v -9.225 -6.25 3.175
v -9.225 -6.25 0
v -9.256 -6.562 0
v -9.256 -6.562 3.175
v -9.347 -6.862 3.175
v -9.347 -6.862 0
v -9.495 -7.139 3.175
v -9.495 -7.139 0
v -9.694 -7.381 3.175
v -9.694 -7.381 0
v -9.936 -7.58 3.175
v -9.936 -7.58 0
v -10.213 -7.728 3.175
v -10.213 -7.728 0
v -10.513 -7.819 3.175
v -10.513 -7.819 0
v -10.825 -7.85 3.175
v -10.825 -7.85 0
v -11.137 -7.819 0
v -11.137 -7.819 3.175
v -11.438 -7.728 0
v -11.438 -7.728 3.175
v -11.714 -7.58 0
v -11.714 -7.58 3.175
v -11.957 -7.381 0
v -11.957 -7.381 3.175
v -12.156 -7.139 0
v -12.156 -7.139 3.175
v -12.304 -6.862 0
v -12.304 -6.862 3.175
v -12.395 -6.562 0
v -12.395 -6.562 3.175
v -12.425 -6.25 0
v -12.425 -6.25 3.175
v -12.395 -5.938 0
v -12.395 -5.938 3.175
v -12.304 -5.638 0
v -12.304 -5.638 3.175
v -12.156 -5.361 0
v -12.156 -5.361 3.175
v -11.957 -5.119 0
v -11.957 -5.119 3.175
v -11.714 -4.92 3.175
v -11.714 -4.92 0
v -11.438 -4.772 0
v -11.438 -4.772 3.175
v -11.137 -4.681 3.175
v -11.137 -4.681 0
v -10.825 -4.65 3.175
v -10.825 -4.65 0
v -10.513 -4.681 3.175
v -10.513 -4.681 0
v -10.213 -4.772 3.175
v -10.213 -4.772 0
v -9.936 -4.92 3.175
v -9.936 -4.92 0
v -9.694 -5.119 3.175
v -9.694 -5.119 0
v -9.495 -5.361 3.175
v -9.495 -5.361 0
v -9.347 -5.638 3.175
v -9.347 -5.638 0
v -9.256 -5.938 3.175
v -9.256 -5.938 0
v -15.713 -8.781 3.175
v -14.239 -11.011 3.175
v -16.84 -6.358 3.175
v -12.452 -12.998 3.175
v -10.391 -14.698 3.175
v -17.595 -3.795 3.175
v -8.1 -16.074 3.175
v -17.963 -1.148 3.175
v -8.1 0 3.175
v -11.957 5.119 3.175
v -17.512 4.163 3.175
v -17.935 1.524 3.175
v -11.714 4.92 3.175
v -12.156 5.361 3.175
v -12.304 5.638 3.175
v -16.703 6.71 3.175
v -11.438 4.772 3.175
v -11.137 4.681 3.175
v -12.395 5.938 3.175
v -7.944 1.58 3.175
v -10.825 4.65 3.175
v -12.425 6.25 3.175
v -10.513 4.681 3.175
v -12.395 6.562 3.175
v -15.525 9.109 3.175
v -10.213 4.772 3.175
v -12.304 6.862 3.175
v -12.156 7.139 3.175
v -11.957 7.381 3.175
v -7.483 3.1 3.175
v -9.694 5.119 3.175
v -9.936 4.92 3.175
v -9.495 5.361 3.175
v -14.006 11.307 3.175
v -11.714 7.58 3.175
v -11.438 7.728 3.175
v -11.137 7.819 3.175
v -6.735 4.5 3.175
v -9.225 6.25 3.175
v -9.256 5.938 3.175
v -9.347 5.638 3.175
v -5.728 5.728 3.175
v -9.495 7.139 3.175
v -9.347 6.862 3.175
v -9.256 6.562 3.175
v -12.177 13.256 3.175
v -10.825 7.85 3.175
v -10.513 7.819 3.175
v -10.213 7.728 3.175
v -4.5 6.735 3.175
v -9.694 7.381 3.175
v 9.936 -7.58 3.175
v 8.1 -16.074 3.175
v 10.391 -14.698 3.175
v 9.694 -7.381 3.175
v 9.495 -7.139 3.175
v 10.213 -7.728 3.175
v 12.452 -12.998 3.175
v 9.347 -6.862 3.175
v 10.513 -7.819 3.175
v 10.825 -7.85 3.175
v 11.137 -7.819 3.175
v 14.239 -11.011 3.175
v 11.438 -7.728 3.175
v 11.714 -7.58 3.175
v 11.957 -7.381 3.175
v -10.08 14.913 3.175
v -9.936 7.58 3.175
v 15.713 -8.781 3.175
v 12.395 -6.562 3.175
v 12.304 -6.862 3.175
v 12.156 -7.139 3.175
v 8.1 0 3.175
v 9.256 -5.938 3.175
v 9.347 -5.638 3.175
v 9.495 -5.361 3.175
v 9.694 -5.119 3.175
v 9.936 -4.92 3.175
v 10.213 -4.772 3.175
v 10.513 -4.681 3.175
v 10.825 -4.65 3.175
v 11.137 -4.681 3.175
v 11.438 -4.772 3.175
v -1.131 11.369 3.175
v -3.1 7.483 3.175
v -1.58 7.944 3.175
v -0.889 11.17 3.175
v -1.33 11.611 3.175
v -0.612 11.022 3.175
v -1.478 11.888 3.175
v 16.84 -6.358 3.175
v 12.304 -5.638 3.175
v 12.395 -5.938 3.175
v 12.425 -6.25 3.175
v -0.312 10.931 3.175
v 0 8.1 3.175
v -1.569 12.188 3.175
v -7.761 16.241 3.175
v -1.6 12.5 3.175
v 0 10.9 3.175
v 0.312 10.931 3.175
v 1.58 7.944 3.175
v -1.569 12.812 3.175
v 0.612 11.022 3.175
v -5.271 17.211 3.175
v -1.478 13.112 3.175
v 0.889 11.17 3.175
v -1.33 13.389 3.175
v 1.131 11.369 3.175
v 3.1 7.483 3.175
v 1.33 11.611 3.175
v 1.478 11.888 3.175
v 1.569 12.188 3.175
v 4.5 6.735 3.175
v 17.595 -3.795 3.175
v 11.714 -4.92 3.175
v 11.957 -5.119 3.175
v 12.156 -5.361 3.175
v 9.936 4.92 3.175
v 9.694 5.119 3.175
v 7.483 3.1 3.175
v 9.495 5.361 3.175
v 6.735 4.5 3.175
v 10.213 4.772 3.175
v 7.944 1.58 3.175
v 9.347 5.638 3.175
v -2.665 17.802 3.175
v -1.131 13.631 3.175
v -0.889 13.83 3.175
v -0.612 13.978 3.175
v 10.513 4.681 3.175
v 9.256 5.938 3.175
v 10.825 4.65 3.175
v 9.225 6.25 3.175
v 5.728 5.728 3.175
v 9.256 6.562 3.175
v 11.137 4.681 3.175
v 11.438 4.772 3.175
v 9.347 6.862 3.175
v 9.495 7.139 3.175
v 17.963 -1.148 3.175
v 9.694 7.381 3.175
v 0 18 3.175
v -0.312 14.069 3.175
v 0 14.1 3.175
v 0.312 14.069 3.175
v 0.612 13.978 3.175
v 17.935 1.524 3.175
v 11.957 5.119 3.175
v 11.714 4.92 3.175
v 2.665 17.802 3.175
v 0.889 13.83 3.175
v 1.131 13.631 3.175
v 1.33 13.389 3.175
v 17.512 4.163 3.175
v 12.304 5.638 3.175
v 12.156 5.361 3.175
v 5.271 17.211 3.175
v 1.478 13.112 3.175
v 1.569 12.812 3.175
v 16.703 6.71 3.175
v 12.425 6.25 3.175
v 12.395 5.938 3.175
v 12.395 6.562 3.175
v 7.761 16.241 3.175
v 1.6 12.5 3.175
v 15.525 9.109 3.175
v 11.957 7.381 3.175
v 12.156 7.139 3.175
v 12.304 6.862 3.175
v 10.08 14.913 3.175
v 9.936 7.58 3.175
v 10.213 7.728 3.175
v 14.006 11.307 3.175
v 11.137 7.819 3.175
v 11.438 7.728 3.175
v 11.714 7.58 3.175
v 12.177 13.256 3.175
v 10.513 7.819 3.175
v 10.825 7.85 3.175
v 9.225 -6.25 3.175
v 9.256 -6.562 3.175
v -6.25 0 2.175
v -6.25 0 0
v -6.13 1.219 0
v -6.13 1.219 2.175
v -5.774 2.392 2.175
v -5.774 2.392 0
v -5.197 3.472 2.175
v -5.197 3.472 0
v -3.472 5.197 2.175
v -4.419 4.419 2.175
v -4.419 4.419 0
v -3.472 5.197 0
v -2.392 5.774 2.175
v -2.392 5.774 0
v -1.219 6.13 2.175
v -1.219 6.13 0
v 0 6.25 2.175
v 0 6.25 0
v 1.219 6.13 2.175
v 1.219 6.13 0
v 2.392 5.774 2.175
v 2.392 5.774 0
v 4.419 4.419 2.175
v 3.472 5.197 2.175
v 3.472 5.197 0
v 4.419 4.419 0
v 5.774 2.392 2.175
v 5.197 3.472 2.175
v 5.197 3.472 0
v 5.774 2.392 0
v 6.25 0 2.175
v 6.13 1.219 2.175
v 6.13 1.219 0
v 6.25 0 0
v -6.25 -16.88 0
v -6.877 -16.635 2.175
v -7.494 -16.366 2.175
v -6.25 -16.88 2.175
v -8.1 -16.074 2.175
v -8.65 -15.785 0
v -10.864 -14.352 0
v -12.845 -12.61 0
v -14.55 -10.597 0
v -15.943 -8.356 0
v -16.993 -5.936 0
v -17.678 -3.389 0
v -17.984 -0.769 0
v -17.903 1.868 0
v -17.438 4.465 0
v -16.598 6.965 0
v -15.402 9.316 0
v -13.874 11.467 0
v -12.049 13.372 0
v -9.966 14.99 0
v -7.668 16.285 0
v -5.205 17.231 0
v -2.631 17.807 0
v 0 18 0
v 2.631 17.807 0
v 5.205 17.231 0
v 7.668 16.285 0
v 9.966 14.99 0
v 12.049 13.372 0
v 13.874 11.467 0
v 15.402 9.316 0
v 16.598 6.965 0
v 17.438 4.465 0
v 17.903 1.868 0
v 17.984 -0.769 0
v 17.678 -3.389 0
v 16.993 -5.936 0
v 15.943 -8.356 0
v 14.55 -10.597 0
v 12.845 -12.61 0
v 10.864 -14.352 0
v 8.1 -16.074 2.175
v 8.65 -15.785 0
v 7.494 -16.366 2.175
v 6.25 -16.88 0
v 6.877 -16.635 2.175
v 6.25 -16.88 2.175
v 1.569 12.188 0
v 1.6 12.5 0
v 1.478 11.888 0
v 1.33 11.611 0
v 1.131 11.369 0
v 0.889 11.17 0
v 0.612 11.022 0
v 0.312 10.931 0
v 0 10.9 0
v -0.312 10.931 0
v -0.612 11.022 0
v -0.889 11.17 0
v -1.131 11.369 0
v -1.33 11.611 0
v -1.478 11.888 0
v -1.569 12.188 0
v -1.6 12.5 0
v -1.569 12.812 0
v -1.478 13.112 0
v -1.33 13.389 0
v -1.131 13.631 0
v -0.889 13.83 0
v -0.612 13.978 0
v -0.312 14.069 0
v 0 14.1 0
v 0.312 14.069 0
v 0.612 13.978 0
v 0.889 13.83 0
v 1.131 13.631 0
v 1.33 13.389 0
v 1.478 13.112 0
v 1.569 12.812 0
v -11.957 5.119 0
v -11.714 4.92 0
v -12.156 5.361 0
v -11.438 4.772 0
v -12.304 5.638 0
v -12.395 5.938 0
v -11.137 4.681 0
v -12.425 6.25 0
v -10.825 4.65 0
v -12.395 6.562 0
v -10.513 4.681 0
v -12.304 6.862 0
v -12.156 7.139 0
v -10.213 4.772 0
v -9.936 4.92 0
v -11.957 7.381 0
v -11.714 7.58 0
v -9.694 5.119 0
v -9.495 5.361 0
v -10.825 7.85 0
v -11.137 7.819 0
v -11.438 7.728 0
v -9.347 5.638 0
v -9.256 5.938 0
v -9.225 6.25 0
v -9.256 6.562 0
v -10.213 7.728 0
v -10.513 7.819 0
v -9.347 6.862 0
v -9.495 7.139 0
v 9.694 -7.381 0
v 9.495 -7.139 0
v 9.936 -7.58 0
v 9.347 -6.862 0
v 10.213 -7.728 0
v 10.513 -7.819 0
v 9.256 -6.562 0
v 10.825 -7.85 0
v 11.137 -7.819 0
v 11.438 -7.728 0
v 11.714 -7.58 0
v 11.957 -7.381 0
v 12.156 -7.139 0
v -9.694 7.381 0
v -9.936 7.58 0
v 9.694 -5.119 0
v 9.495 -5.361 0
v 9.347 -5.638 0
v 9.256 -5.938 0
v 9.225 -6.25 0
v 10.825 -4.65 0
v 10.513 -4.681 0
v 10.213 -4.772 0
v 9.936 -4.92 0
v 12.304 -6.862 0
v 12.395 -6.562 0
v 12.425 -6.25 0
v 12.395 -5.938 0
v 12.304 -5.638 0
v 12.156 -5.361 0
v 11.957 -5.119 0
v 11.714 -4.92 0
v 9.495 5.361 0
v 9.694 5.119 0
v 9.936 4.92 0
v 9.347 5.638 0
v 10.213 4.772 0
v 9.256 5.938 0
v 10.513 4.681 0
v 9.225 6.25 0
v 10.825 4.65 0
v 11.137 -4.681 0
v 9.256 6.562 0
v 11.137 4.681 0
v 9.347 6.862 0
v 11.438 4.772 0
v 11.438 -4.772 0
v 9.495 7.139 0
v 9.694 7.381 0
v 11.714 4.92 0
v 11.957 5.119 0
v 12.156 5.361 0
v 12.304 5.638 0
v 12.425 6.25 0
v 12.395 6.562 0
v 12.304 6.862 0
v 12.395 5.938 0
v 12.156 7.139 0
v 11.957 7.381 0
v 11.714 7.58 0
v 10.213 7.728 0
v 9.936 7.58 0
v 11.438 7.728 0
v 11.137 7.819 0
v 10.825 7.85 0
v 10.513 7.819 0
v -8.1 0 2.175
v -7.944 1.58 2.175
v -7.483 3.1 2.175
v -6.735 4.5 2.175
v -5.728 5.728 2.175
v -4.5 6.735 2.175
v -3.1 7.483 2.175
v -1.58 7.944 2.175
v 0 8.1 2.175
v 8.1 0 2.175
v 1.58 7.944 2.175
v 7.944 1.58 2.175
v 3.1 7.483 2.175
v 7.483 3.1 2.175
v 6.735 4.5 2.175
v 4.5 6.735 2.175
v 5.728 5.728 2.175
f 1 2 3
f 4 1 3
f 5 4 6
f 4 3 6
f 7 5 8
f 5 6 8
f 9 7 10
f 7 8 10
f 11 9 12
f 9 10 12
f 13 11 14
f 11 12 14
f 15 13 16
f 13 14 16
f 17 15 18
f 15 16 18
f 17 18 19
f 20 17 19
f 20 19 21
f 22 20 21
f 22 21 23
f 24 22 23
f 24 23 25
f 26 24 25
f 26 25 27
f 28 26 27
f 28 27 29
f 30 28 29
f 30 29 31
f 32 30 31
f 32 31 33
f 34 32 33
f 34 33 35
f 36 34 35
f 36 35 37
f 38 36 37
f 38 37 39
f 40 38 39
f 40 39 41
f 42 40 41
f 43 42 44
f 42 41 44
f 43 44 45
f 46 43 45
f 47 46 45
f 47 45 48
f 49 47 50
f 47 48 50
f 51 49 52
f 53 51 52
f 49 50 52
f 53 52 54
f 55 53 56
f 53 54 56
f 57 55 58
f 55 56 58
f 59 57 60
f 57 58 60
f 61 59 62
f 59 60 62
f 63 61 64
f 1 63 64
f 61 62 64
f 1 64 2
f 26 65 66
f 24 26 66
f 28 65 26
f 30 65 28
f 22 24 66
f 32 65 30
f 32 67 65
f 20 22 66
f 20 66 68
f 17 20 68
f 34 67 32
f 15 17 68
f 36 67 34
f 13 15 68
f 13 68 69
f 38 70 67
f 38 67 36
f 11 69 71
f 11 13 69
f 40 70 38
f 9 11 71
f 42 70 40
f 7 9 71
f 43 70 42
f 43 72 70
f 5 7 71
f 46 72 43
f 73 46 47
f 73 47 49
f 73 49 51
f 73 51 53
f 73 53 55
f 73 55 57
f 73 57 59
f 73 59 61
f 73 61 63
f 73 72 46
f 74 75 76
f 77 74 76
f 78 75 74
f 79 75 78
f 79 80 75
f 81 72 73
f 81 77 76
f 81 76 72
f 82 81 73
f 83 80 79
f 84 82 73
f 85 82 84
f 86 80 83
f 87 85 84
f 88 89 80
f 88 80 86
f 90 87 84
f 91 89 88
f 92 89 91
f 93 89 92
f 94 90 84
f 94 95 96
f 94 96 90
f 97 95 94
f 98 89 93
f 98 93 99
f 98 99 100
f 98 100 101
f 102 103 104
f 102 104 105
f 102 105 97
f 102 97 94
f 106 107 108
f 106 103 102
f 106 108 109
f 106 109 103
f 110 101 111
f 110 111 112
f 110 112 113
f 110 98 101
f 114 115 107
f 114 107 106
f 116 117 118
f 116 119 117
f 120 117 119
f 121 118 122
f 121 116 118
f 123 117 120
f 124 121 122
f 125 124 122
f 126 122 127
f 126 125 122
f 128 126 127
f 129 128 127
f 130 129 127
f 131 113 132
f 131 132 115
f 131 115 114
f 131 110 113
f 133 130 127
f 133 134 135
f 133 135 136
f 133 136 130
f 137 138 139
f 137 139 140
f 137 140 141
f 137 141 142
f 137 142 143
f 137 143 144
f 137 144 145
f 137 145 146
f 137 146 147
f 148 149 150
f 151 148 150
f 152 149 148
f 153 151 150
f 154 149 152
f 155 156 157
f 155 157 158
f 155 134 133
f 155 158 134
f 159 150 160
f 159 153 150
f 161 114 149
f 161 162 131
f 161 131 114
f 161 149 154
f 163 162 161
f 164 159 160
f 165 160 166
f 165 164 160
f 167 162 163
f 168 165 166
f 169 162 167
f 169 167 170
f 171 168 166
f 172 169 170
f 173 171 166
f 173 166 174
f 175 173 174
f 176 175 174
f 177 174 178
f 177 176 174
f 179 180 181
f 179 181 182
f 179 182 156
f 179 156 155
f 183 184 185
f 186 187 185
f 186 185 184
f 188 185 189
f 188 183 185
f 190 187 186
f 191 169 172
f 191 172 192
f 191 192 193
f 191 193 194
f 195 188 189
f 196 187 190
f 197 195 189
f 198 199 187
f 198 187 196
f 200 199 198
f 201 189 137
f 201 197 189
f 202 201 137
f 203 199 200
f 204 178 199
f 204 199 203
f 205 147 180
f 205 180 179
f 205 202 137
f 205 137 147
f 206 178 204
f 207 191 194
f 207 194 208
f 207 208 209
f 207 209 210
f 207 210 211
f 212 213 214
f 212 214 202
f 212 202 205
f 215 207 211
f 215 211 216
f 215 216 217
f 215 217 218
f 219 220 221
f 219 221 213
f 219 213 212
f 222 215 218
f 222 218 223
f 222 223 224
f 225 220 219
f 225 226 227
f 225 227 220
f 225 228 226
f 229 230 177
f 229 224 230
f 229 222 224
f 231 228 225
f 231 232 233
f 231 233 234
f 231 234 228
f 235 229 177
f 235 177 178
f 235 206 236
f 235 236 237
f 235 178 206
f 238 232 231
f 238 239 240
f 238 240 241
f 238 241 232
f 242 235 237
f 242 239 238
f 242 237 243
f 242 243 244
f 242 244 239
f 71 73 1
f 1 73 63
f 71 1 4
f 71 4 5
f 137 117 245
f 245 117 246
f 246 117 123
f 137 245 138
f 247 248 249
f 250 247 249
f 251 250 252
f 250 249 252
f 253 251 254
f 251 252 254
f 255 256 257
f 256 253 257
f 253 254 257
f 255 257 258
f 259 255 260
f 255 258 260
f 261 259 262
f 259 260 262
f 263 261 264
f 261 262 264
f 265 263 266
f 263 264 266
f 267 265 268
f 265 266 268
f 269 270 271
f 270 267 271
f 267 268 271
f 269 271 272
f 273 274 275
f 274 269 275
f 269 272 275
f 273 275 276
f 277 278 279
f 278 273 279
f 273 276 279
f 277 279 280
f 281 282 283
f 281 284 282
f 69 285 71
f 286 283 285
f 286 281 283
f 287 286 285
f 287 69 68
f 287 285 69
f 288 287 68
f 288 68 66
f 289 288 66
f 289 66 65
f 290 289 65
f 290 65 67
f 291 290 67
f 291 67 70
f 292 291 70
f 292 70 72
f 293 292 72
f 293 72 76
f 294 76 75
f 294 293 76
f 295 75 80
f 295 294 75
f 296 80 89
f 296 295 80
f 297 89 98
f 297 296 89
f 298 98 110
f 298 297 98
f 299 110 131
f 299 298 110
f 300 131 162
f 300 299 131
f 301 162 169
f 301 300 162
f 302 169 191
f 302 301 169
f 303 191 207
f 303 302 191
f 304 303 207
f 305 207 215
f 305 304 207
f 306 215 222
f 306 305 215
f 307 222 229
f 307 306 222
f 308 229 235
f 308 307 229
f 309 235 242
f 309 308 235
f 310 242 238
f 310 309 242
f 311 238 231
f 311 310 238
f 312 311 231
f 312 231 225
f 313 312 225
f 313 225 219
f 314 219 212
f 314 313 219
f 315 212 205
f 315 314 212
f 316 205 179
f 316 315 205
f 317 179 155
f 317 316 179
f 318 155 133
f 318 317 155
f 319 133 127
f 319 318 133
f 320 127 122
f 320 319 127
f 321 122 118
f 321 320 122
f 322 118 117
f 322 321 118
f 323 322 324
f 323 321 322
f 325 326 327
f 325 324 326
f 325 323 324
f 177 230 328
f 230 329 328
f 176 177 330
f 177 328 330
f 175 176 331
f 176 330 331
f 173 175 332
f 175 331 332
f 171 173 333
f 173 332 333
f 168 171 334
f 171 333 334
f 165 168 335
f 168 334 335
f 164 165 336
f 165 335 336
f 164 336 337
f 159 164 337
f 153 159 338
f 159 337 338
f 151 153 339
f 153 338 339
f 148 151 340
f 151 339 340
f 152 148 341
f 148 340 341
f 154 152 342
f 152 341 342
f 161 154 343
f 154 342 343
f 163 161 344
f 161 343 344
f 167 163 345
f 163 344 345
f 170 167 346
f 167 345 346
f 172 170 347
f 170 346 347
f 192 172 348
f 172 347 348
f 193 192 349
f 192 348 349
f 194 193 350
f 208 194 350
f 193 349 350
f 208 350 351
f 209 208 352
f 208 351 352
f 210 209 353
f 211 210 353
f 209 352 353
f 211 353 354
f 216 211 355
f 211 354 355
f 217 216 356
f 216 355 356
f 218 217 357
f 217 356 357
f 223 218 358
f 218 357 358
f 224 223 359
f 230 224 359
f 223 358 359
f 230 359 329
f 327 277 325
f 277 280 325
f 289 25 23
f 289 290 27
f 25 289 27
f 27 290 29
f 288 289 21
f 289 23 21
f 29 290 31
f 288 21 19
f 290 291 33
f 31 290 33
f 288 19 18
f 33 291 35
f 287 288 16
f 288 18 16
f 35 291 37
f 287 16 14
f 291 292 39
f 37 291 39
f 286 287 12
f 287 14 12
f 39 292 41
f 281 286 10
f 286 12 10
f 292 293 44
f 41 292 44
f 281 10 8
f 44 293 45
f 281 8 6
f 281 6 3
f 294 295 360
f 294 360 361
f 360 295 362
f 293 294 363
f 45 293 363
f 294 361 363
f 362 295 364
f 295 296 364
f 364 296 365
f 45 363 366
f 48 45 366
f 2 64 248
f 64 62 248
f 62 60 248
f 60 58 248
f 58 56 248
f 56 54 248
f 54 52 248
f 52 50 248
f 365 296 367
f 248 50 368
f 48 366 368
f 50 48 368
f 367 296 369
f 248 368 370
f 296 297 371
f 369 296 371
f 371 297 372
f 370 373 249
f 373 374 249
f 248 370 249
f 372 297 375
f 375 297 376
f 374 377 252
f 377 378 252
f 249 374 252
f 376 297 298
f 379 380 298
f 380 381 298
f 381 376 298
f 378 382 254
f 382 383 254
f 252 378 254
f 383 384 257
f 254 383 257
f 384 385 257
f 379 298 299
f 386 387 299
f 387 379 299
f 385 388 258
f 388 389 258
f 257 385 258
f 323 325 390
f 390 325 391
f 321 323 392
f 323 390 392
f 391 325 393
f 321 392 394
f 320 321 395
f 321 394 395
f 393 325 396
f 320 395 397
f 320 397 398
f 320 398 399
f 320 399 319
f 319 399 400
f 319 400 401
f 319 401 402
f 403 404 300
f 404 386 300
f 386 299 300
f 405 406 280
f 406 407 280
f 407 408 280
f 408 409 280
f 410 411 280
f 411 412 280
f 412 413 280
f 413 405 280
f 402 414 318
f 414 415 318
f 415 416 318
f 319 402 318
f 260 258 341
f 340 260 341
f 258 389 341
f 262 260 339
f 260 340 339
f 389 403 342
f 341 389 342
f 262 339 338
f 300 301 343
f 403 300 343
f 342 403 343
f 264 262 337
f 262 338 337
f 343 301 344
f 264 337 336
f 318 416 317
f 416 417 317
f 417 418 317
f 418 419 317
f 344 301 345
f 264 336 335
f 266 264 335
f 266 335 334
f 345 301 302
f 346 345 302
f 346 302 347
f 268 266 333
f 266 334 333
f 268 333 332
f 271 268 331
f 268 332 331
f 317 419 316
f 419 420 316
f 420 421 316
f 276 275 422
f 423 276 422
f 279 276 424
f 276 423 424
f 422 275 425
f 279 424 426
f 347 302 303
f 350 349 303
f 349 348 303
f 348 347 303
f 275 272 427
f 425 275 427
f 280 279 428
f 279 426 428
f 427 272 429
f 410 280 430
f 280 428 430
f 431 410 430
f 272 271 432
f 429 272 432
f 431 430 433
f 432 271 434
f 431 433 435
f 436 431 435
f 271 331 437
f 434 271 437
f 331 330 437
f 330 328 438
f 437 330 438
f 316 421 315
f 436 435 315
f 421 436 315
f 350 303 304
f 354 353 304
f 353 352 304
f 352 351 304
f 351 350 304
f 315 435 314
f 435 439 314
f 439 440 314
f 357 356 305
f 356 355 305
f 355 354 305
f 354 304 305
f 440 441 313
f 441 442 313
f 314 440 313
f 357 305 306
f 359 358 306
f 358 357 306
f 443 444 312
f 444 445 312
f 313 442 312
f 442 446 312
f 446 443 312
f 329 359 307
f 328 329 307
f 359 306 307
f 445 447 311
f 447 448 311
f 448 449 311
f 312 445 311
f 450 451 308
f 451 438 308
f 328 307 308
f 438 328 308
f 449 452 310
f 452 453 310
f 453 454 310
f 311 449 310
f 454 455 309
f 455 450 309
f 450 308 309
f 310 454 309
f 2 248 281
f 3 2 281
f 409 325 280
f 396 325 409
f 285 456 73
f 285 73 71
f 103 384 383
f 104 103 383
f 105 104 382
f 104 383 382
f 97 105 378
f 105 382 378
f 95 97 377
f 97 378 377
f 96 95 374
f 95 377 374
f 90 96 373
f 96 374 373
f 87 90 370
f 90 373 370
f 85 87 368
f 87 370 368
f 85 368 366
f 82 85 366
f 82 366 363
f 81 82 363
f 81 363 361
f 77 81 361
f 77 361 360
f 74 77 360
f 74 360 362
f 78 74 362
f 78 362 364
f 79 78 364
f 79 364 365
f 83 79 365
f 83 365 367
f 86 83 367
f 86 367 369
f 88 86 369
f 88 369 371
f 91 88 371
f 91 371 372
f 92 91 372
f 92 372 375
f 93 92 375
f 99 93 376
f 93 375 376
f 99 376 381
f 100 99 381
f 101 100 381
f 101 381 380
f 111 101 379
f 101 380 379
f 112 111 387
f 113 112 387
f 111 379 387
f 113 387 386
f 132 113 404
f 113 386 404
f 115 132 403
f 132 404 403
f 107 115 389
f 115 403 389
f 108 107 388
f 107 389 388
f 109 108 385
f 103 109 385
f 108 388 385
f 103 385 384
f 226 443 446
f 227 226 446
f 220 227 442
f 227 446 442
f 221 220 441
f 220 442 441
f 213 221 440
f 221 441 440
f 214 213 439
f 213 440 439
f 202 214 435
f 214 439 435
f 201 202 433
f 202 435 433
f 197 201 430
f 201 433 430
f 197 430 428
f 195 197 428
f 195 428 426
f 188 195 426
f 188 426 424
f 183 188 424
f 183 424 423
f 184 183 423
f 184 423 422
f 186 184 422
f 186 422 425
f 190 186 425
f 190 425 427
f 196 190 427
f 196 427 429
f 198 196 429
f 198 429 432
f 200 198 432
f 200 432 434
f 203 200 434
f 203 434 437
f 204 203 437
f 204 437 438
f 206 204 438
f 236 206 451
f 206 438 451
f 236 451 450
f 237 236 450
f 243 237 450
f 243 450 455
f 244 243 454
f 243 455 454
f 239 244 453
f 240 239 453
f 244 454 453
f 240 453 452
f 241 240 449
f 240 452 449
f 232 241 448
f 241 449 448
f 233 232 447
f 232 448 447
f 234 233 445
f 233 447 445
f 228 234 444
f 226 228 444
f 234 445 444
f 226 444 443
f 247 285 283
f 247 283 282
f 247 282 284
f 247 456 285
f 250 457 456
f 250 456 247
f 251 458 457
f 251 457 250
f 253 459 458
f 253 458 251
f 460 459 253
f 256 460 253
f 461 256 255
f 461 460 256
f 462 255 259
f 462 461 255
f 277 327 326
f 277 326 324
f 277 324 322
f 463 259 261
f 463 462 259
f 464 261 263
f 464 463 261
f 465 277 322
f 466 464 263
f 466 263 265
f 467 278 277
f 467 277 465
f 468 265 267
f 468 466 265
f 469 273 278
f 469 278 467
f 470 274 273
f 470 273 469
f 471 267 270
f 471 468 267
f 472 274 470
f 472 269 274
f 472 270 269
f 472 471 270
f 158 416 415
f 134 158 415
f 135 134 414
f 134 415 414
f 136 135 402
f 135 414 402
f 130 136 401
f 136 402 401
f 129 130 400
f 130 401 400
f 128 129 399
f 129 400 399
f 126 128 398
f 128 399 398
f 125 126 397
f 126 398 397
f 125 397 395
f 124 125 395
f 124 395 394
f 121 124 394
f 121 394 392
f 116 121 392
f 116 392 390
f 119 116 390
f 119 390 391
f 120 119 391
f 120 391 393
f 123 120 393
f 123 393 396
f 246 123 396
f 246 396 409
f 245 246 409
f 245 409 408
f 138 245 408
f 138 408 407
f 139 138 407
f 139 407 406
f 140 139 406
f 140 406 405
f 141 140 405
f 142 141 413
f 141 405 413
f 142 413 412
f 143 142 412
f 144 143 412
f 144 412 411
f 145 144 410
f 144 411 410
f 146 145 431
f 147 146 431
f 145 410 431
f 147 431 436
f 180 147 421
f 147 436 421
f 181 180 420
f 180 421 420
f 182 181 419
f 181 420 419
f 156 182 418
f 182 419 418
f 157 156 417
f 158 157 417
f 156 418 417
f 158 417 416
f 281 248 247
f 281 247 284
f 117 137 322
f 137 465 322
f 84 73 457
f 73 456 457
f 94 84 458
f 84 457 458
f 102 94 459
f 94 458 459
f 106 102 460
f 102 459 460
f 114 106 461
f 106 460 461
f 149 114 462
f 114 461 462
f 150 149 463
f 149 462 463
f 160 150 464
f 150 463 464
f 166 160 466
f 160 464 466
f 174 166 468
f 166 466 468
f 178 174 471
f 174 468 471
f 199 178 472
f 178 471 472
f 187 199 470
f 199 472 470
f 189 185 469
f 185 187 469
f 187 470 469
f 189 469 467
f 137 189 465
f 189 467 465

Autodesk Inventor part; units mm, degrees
ref_plane "YZ Plane" through (0, 0, 0) normal (1, 0, 0) x (0, 1, 0)
ref_plane "XZ Plane" through (0, 0, 0) normal (0, 1, 0) x (-1, 0, 0)
ref_plane "XY Plane" through (0, 0, 0) normal (0, 0, 1) x (1, 0, 0)
sketch "Sketch1" plane through (0, 0, 0) normal (0, 0, 1) x (1, 0, 0)
  arc A0 (6.25, 0) -> (-6.25, 0) centre (0, 0) ccw
  arc A1 (8.1, 0) -> (-8.1, 0) centre (0, 0) ccw
  arc A2 (8.1, -9.5205) -> (-8.1, -9.5205) centre (0, 0) ccw
  arc A3 (6.25, -16.8801) -> (-6.25, -16.8801) centre (0, 0) ccw
  line L0 (-6.25, 0) -> (-6.25, -16.8801)
  line L1 (6.25, 0) -> (6.25, -16.8801)
  line L2 (8.1, 0) -> (8.1, -16.0745)
  line L3 (-8.1, 0) -> (-8.1, -16.0745)
  circle A4 centre (0, 12.5) radius 1.6
  circle A5 centre (-10.8253, 6.25) radius 1.6
  circle A6 centre (-10.8253, -6.25) radius 1.6
  circle A7 centre (0, -12.5) radius 1.6
  circle A8 centre (10.8253, -6.25) radius 1.6
  circle A9 centre (10.8253, 6.25) radius 1.6
  dimension "d0" = 12.5
  dimension "d2" = 16.2
  dimension "d3" = 25
  dimension "d4" = 36
  dimension "d5" = 3.2
  dimension "d8" = 360
extrude "Extrusion1" add sketch "Sketch1" along normal blind 2.175 contours A0 L0 A3 L3 A1 L2 L1
extrude "Extrusion2" add sketch "Sketch1" along normal blind 3.175 contours L2 A2 A8 A9 A4 A5 A6 L3 A3 | L2 A1 L3 A2 A6 A5 A4 A9 A8 | A8 A2 | A2 A8 | A6 A2 | A2 A6 | A9 A2 | A2 A9 | A5 A2 | A2 A5 | A4 A2 | A2 A4
extrude "Extrusion3" cut sketch "Sketch1" along normal through all contours A8 A2 | A2 A8 | A6 A2 | A2 A6 | A9 A2 | A2 A9 | A5 A2 | A2 A5 | A4 A2 | A2 A4
equation "\"d12\" = THICKA"
equation "\"THICKA\" = 3.175"
equation "\"THICKB\" = 6.731"
equation "\"THICKC\" = 12.7"
equation "\"BALLDIA\" = 12"
equation "\"MAGDIA\" = 9.5"
equation "\"THICKPLY\" = 5"
properties part number "Effector_GrooveMount"
